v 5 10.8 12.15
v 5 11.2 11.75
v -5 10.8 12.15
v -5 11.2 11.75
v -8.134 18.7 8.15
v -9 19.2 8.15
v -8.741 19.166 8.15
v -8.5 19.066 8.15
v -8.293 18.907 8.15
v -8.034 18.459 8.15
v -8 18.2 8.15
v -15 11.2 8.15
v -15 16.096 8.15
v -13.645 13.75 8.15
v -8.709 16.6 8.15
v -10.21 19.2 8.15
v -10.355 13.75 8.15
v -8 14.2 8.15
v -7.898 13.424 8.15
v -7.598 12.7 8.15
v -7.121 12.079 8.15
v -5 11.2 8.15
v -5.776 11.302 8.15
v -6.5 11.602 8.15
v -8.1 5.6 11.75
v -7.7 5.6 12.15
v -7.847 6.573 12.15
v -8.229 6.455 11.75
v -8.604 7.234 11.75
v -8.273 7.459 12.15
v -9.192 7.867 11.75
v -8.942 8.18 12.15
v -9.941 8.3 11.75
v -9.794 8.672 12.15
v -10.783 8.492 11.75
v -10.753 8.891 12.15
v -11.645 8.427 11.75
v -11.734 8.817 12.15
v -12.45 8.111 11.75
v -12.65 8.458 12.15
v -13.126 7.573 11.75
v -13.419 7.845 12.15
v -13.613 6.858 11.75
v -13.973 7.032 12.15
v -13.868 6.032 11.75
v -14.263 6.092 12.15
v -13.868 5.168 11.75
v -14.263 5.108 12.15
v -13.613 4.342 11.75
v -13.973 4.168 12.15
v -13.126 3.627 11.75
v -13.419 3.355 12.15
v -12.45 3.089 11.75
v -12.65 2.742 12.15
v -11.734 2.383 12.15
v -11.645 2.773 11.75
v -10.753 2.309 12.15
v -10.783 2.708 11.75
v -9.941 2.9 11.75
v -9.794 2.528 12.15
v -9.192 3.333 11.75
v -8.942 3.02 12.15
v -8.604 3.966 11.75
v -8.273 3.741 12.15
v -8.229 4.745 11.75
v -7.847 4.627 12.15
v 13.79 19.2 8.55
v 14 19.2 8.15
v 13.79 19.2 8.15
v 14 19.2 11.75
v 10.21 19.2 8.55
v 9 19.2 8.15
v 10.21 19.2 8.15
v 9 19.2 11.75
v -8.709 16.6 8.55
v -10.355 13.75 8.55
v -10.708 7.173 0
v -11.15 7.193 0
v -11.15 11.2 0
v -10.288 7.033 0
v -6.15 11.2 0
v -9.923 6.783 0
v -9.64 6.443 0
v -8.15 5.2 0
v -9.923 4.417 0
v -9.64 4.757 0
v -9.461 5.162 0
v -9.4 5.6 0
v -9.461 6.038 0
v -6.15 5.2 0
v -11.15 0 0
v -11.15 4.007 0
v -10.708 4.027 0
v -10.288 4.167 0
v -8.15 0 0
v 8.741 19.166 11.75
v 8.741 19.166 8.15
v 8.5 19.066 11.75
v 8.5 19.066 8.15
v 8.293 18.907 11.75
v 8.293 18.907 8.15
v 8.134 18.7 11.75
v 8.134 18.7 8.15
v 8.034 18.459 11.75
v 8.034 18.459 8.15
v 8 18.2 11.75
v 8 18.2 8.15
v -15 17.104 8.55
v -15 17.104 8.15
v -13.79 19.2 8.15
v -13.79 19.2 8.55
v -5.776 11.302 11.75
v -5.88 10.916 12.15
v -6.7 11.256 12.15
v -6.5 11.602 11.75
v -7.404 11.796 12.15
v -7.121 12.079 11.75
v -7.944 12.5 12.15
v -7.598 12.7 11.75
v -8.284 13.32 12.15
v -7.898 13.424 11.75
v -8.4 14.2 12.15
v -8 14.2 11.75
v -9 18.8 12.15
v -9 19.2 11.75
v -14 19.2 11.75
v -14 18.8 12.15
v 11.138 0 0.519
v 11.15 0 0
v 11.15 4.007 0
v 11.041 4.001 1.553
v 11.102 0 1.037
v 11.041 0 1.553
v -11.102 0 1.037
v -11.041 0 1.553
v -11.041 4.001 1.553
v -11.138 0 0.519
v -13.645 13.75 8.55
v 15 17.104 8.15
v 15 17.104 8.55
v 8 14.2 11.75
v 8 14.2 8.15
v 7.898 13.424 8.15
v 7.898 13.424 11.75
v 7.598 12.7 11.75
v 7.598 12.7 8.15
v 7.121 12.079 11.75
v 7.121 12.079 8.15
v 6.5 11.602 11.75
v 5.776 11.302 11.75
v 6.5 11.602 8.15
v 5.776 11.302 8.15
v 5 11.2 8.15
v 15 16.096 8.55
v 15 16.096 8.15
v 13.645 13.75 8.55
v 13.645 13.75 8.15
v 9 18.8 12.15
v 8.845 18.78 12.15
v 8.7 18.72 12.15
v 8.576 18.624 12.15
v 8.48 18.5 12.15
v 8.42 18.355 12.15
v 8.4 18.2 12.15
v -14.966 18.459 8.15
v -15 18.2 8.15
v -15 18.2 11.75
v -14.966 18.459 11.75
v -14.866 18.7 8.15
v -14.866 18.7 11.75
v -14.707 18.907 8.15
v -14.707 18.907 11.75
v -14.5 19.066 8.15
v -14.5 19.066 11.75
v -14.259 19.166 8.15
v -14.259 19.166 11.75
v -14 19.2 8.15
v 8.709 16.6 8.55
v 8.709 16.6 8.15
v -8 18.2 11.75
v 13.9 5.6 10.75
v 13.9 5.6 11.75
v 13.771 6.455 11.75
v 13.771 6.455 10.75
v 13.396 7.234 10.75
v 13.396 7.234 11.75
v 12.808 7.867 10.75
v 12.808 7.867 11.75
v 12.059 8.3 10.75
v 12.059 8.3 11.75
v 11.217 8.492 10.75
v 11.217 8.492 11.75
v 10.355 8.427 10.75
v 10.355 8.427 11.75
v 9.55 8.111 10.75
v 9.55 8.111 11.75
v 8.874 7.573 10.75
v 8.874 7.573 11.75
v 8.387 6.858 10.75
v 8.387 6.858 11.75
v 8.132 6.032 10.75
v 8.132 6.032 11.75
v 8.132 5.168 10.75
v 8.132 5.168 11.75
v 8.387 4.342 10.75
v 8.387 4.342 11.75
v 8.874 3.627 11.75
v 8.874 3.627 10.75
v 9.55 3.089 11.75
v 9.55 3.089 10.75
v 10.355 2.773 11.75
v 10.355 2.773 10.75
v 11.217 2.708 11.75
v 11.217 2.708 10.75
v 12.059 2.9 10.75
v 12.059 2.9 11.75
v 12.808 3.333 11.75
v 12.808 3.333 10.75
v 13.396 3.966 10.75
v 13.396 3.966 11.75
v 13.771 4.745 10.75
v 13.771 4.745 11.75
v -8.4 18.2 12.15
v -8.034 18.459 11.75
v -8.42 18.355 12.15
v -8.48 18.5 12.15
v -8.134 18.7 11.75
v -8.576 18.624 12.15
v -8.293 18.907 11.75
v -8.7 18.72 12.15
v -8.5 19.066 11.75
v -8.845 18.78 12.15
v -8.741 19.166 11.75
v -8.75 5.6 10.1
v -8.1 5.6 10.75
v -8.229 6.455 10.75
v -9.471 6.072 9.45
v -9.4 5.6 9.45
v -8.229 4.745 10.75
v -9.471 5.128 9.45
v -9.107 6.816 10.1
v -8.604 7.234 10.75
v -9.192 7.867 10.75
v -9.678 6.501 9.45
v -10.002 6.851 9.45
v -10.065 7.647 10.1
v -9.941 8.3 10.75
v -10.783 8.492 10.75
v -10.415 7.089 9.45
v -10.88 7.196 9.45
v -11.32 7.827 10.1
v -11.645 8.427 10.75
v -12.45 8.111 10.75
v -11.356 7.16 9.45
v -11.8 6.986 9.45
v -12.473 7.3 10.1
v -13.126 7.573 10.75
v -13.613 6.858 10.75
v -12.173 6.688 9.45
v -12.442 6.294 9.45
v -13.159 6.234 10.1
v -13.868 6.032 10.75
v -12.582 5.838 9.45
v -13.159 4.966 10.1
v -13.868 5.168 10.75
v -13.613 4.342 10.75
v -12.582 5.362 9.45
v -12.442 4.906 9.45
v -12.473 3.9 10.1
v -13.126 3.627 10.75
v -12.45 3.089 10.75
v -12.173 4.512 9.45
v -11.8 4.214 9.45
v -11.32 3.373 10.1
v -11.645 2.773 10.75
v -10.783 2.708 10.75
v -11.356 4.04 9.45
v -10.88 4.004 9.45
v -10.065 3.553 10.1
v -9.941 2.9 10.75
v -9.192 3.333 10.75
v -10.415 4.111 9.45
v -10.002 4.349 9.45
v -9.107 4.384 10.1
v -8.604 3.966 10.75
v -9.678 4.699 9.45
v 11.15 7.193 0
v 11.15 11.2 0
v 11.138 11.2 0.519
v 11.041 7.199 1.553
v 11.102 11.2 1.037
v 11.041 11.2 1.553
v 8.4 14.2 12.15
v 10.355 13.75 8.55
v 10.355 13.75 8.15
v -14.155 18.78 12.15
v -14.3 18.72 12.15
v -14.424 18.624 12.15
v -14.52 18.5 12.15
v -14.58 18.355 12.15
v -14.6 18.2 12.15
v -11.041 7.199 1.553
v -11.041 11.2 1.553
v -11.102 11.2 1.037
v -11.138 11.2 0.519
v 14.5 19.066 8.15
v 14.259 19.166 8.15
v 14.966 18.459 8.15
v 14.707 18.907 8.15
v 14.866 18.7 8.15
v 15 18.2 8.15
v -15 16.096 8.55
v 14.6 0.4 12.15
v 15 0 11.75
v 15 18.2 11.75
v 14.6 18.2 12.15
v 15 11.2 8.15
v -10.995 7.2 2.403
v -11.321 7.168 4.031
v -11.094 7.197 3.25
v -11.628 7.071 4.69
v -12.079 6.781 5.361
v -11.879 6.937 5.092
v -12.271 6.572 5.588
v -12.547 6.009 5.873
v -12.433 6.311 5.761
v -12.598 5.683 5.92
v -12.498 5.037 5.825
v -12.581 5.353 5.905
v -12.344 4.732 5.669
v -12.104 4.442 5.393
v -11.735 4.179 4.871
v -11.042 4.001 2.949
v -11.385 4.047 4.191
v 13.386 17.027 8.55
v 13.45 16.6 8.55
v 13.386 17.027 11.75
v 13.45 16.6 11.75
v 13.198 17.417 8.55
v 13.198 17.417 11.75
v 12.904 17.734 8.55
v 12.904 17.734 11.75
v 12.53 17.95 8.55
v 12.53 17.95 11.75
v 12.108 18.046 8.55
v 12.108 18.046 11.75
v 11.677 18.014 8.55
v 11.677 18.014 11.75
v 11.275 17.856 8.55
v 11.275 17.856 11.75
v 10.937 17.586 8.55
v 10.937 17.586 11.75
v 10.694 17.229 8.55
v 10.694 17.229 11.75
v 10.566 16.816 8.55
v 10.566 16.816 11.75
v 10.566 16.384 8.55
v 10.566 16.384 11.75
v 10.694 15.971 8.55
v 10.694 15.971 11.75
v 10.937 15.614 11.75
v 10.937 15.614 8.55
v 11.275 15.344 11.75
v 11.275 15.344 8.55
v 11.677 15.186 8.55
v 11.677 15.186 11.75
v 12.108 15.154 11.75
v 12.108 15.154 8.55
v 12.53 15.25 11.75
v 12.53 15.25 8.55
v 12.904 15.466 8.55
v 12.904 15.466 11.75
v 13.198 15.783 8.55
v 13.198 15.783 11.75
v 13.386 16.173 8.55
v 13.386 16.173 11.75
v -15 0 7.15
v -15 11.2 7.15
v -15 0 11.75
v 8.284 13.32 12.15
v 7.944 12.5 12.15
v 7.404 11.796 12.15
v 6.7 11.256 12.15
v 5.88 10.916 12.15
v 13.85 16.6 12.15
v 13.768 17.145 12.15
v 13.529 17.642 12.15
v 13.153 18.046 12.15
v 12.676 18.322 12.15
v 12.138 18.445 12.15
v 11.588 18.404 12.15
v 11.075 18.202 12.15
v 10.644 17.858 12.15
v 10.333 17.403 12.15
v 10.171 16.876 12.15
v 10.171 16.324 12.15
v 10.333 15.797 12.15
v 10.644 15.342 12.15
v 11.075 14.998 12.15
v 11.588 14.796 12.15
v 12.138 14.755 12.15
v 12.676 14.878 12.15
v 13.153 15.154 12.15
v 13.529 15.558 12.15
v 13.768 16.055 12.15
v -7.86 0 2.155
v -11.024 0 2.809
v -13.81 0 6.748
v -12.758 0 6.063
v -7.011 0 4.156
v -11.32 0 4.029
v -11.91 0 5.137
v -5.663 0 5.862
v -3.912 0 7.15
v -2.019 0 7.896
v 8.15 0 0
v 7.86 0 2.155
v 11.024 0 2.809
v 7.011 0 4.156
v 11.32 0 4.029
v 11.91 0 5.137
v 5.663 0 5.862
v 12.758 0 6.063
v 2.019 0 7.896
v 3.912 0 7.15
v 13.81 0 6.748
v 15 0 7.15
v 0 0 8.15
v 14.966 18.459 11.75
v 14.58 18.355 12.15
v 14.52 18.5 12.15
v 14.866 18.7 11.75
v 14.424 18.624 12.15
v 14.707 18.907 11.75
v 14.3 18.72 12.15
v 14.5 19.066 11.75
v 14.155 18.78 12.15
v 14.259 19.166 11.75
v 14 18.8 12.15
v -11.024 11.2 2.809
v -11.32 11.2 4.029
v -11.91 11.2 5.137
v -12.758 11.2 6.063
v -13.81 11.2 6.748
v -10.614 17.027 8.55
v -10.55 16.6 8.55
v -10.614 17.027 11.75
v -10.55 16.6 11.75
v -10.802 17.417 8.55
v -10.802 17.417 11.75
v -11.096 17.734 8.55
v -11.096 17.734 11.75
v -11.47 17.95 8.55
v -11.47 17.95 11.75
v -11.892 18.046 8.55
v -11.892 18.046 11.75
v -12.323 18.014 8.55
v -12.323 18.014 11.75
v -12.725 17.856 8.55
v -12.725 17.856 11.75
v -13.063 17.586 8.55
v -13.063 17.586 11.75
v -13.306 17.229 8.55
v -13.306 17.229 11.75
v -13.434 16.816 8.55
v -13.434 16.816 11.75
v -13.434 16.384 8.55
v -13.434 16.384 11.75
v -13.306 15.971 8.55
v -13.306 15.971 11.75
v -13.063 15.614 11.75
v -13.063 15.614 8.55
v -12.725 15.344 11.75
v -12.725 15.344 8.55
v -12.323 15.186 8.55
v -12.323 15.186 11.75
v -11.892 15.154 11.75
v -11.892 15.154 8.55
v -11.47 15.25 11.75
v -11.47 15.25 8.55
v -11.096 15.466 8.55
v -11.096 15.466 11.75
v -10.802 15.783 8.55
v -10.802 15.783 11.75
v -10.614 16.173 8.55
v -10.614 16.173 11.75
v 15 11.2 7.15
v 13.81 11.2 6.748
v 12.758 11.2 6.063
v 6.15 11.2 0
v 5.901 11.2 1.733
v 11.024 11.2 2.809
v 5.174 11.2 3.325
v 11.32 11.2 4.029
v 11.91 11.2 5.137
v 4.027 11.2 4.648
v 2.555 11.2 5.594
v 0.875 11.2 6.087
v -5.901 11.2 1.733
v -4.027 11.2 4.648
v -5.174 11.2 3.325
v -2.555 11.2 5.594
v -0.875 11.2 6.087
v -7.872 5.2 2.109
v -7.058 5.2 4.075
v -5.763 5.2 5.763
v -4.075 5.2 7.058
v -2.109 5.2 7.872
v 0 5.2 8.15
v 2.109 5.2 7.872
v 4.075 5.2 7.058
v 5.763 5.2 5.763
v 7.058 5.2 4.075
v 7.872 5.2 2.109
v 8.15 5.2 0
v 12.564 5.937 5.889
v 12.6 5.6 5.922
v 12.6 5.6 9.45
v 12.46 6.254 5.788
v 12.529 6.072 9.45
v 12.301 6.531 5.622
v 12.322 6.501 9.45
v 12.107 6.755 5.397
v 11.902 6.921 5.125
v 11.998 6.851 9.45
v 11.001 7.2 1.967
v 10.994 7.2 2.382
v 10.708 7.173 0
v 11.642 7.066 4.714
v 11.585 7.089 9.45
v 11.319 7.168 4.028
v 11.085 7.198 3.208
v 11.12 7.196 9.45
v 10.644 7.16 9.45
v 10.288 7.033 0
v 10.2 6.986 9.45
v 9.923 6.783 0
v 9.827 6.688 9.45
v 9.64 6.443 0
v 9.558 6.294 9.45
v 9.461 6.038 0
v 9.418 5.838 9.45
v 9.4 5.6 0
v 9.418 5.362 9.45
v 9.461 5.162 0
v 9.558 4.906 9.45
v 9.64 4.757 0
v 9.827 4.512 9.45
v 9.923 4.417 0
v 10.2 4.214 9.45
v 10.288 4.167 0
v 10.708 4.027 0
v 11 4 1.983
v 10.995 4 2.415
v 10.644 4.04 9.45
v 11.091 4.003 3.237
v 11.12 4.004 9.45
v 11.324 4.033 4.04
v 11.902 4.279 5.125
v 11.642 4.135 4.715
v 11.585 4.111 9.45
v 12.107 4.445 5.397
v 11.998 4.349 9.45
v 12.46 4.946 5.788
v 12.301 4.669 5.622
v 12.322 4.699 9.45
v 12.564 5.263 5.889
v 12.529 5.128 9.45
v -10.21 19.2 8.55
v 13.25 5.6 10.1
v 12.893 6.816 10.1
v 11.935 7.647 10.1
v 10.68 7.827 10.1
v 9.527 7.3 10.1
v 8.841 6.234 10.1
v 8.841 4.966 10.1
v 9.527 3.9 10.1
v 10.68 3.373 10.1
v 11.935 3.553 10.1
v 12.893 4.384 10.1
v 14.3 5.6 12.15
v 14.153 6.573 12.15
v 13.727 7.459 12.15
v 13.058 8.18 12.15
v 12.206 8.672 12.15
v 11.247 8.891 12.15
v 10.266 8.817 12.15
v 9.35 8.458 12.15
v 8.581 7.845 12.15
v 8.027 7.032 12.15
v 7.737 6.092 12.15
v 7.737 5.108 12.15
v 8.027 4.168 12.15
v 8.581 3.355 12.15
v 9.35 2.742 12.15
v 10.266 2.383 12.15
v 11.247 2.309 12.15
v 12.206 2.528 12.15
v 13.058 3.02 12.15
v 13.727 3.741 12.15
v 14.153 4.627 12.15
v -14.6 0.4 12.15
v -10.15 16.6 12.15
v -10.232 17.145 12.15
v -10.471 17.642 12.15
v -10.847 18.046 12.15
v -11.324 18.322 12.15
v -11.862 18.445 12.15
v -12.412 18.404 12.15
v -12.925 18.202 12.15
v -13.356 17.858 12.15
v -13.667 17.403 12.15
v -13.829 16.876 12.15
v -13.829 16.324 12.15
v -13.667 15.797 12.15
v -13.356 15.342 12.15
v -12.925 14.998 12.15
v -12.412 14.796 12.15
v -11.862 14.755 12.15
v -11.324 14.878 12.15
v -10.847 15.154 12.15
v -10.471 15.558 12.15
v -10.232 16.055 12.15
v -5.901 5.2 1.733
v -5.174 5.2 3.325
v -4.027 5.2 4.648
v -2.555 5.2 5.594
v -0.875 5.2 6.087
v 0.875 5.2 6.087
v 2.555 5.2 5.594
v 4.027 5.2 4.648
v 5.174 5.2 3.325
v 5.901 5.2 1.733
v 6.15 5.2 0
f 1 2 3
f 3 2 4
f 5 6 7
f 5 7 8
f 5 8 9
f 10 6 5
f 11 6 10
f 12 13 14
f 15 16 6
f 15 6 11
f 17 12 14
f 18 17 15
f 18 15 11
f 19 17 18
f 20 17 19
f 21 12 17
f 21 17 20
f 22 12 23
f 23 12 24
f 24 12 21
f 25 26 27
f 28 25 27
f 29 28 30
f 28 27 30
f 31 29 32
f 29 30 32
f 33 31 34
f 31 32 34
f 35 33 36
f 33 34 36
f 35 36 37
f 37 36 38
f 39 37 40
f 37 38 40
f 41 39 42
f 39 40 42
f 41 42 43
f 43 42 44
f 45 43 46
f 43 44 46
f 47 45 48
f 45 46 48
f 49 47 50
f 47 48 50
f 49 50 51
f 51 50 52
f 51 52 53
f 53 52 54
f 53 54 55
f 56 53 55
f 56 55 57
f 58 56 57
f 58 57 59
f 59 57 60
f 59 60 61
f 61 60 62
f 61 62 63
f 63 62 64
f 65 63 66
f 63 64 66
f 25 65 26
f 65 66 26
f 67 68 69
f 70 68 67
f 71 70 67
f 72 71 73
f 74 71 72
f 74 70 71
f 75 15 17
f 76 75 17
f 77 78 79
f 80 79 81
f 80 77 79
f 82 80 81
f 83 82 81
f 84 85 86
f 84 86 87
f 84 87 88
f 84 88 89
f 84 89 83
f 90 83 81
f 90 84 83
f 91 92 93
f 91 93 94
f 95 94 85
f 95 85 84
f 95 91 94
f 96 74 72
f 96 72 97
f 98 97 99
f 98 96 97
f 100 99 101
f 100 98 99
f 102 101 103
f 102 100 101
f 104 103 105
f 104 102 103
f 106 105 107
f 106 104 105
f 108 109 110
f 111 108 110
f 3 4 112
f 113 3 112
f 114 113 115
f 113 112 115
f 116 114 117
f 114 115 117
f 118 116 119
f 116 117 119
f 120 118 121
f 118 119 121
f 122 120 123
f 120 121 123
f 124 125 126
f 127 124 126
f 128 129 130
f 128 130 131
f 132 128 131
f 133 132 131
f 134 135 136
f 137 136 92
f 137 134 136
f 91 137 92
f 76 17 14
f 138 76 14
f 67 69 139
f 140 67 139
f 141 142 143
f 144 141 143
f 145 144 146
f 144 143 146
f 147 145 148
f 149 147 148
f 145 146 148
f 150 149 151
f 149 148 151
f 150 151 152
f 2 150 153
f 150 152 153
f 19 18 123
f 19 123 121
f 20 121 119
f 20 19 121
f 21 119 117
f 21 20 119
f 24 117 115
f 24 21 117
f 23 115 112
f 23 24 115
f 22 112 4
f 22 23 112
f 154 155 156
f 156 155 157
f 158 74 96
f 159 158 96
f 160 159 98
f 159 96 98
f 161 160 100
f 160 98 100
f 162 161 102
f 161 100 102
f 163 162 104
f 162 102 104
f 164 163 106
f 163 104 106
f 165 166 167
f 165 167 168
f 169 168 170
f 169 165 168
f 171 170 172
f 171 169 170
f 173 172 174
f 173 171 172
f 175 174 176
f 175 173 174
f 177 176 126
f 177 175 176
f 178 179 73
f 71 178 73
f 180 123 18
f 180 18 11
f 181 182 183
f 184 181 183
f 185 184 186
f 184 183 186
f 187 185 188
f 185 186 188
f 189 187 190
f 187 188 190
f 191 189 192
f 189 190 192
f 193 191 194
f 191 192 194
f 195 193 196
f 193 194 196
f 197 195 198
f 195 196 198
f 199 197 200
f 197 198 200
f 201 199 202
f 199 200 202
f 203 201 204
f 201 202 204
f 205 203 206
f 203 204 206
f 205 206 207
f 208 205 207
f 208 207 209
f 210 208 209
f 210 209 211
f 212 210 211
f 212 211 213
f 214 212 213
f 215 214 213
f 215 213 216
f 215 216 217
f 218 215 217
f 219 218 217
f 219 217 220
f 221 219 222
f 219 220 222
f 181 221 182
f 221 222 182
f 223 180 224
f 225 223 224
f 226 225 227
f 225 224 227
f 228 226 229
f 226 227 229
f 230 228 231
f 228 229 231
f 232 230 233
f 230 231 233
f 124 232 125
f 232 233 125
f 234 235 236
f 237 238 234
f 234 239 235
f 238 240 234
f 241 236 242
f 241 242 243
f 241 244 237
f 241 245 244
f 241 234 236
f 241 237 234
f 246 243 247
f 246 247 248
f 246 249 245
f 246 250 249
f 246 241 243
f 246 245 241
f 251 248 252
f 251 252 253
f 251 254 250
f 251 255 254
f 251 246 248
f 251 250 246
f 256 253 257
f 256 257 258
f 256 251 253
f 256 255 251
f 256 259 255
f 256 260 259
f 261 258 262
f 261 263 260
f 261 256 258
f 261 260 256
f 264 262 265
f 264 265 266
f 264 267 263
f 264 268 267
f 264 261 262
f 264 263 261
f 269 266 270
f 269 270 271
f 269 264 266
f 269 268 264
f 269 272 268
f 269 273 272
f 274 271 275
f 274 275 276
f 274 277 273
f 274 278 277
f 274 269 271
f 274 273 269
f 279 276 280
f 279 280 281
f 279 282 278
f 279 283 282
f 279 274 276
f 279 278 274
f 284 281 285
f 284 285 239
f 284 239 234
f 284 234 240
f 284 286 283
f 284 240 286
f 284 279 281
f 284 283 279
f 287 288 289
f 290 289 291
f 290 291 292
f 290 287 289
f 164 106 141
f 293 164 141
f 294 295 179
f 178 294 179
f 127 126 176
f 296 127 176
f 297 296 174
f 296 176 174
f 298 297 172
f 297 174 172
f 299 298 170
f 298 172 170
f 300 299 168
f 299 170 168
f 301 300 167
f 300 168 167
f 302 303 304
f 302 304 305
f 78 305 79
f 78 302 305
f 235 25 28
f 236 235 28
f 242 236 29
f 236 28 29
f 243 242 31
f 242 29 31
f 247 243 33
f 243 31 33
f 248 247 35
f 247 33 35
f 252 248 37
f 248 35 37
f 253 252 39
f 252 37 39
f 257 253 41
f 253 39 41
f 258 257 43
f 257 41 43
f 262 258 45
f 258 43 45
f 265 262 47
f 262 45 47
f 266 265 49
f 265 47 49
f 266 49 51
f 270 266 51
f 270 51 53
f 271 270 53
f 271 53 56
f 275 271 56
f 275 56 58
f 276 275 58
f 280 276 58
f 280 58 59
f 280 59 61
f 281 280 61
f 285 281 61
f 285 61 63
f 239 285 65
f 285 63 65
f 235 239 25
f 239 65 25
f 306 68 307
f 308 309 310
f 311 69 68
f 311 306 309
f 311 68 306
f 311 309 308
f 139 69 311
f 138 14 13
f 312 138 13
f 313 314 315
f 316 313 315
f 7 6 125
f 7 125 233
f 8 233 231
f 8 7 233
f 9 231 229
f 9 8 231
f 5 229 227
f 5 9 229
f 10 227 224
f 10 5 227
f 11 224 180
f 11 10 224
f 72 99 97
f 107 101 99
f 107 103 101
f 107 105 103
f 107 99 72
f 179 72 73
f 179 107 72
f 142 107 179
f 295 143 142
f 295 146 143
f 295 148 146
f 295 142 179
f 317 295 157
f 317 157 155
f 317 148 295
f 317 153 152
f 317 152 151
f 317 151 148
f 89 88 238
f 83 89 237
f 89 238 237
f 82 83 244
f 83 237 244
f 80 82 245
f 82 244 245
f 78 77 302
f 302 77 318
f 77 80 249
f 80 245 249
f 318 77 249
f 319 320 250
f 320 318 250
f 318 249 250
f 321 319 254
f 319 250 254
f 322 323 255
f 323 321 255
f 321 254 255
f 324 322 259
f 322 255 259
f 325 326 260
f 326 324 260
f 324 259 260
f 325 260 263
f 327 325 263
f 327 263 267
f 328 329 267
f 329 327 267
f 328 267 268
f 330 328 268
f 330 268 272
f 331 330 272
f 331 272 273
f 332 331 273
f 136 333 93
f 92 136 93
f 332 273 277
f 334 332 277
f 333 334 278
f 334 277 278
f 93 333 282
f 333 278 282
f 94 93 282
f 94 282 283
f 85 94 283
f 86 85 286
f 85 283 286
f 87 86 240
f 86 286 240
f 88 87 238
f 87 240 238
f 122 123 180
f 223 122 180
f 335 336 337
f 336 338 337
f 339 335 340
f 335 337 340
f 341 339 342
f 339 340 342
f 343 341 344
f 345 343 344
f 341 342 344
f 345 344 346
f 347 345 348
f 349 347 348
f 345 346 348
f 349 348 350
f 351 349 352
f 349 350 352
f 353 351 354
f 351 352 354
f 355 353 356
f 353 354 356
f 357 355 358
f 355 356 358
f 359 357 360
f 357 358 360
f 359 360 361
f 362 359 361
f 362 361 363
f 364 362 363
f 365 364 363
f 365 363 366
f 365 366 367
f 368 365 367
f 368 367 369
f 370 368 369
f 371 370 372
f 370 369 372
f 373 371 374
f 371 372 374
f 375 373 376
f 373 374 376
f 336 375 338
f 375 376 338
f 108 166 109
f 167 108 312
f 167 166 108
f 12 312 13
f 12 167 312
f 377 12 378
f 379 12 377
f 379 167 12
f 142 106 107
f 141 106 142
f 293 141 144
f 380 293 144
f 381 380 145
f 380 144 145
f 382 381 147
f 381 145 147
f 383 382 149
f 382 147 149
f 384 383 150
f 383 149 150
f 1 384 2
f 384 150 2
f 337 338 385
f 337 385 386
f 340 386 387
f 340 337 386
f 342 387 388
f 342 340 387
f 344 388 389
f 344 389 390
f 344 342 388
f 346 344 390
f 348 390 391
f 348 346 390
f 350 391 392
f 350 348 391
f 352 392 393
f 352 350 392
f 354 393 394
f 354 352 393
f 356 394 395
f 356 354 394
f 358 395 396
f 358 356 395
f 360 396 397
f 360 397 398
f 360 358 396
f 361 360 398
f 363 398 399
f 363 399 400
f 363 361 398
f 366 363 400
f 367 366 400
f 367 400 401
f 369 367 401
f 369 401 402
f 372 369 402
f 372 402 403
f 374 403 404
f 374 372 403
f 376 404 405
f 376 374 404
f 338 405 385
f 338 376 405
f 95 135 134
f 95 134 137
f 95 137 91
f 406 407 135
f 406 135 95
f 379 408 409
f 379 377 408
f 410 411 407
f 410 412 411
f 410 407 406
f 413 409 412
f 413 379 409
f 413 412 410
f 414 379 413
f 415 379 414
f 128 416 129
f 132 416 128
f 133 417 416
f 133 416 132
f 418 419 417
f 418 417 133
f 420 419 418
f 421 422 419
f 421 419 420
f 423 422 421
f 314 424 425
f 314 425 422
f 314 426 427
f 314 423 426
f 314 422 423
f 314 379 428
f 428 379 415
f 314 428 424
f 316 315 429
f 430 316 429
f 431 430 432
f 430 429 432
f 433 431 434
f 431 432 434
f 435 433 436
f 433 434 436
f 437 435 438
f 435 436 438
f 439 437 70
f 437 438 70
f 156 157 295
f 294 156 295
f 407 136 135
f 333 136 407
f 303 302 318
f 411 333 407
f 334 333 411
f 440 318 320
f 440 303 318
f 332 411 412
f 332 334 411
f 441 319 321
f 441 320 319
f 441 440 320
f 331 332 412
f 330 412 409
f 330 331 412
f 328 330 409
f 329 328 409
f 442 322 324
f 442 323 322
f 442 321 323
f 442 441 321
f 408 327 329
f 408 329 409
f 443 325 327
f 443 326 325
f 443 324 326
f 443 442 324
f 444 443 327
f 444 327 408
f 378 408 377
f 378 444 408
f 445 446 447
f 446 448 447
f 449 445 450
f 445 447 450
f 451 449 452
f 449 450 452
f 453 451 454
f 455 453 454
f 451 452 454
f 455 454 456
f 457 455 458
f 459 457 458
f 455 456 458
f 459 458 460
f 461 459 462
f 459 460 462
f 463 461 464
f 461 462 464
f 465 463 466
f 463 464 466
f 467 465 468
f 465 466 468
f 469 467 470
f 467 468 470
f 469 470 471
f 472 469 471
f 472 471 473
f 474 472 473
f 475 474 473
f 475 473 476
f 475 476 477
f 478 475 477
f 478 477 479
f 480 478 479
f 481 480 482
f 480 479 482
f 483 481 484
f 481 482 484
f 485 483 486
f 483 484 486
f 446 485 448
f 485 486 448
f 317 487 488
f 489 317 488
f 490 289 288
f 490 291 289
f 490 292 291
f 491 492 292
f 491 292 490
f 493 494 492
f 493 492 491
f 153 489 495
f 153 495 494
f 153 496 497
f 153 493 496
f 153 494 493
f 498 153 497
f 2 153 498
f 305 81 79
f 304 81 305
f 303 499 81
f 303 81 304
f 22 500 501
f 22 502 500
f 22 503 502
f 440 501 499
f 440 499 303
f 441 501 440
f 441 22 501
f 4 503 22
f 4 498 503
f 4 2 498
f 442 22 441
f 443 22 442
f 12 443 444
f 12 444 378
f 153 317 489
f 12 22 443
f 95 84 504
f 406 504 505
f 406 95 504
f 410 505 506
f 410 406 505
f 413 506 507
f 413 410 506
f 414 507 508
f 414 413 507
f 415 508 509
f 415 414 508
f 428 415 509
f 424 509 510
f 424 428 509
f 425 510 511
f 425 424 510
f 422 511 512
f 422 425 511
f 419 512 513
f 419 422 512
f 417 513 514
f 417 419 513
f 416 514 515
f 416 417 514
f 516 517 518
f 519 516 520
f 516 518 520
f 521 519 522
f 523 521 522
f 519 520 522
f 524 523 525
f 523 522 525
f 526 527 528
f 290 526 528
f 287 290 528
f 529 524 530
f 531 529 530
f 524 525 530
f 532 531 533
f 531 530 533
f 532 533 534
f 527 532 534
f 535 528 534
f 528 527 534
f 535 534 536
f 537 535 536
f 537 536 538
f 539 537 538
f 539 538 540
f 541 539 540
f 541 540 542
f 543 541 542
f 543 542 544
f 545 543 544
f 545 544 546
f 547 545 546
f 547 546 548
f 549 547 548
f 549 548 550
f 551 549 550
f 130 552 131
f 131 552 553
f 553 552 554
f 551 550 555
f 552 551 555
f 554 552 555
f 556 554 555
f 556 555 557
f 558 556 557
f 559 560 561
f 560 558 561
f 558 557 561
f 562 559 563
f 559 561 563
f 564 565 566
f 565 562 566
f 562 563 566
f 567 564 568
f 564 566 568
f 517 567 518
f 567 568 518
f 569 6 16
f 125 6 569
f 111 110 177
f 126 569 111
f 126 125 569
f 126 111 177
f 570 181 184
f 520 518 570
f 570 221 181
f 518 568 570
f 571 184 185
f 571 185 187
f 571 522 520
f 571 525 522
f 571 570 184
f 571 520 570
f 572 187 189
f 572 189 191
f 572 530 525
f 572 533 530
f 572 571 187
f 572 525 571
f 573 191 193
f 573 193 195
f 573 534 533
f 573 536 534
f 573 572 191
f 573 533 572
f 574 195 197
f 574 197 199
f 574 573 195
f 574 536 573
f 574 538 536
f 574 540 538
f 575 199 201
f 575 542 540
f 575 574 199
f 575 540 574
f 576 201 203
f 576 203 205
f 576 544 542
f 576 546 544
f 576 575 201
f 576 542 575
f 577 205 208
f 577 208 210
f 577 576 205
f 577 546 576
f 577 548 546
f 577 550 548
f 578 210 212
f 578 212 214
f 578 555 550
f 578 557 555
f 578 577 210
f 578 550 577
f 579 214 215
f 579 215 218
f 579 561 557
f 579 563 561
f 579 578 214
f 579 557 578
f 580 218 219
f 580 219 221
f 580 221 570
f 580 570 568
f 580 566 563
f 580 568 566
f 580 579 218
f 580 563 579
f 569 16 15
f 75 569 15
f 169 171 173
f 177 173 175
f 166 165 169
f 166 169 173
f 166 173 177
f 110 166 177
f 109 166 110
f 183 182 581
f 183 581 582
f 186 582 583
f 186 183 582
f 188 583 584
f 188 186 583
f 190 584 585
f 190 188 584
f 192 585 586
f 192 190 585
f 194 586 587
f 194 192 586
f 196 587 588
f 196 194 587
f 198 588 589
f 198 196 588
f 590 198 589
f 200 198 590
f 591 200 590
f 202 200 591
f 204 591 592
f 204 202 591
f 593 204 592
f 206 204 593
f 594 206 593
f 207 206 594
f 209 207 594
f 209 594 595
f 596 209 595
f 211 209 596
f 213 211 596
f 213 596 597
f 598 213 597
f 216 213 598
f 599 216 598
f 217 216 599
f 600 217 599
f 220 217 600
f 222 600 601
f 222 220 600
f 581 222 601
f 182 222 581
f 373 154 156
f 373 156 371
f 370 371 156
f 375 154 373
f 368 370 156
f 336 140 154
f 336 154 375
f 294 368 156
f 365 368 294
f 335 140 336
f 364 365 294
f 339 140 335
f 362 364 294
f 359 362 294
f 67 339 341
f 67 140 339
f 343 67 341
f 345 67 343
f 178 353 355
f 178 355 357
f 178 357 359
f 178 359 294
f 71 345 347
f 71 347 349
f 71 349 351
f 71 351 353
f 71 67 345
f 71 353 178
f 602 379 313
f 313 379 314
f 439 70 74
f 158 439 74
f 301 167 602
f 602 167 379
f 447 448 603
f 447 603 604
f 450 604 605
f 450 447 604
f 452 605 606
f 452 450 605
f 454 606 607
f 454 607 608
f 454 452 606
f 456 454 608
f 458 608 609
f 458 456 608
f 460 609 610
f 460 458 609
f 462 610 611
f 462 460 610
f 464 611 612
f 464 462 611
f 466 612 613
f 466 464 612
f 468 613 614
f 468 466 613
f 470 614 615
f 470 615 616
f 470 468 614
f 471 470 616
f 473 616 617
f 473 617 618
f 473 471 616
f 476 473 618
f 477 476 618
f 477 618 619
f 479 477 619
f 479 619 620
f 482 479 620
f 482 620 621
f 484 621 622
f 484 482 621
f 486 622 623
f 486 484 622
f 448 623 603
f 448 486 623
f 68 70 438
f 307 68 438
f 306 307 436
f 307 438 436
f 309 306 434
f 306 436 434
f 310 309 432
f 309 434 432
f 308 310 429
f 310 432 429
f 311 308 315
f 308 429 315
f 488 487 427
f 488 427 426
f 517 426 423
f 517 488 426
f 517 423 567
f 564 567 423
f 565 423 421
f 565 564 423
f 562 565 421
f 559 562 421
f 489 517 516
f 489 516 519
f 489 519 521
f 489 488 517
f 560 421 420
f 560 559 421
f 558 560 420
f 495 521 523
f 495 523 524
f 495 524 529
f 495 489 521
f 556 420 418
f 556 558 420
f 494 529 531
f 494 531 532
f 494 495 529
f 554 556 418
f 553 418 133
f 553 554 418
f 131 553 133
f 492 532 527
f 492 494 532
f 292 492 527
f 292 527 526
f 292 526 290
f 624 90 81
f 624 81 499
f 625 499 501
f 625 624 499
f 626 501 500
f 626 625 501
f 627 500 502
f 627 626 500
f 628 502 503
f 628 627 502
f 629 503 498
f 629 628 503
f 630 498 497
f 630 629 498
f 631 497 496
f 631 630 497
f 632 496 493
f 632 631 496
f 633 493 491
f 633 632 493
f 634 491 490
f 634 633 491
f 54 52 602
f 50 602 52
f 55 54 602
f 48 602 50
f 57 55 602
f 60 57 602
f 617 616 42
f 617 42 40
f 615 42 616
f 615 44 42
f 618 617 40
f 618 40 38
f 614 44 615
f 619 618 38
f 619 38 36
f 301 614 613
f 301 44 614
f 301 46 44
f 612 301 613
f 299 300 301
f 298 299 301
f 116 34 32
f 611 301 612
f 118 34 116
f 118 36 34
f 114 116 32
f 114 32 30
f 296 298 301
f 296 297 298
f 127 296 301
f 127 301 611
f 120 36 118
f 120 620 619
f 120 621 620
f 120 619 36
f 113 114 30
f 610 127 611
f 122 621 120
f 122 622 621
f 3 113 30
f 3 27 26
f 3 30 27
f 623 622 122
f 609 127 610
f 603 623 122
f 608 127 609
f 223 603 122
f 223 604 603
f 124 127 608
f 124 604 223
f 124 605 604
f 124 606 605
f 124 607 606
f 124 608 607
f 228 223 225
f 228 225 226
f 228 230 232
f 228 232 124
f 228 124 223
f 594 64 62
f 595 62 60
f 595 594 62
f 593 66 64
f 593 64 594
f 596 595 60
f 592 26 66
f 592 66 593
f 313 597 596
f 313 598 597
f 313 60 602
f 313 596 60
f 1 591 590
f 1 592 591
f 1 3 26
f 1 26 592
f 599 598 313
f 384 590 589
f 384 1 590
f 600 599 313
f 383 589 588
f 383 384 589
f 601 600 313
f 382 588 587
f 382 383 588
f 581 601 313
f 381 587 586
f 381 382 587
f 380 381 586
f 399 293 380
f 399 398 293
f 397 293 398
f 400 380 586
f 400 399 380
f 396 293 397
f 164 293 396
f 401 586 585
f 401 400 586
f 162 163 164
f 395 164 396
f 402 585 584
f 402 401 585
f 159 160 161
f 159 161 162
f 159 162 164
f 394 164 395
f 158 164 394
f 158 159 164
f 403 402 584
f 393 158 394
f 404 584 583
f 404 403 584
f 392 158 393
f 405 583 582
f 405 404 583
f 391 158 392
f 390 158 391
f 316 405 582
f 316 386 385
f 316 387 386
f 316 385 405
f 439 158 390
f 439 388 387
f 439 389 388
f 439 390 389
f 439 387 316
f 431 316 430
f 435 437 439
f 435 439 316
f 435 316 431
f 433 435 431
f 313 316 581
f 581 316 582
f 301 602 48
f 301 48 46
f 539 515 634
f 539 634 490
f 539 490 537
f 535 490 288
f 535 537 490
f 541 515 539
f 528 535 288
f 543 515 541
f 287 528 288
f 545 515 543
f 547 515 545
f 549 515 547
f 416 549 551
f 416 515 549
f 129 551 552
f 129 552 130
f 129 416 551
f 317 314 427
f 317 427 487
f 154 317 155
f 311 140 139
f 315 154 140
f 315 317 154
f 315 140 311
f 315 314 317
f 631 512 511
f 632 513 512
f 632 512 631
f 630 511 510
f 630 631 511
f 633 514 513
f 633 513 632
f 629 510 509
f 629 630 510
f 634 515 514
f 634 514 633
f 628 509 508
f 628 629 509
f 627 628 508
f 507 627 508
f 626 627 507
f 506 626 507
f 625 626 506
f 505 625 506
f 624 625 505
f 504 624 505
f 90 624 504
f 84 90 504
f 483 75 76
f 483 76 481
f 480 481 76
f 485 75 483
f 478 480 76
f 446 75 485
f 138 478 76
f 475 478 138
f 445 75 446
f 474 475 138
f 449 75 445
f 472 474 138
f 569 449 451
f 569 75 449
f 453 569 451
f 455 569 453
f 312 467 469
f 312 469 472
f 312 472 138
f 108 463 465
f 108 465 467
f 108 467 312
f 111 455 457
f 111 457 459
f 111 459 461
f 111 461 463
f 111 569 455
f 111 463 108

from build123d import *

# Parameters (mm, degrees)
EXTRUDE_1_DEPTH     = 5.2
EXTRUDE_2_DEPTH     = 6
EXTRUDE_START       = -11.2
EXTRUDE_3_DEPTH     = 11.2
FILLET_1_R          = 5
SKETCH_4_R          = 1.6
CUT_EXTRUDE_1_DEPTH = 22.789045413
SKETCH_7_W          = 7
SKETCH_7_H          = 3
EXTRUDE_5_DEPTH     = 8
SKETCH_8_R          = 1.45
CUT_EXTRUDE_3_DEPTH = 8
EXTRUDE_START_2     = 1
SKETCH_9_R          = 1.45
SKETCH_9_R_2        = 1.6
EXTRUDE_6_DEPTH     = 1
FILLET_2_R          = 3
FILLET_3_R          = 1
SKETCH_10_R         = 2.9
CUT_EXTRUDE_4_DEPTH = 2.7
CHAMFER_2_SIZE      = 1.3
CHAMFER_1_SIZE      = 0.4
CUT_EXTRUDE_5_DEPTH = 0.4


# Some blends are built 0.0001 mm under size
with BuildPart() as part:
    # 草图1 → 凸台-拉伸1 (new body)
    with BuildSketch(Plane(origin=(0, 0, 0), x_dir=(1, 0, 0), z_dir=(0, 1, 0))):
        with BuildLine():
            Line((-11.15, 0), (-8.15, 0))
            ThreePointArc((-8.15, 0), (0, -8.15), (8.15, 0))
            Line((8.15, 0), (11.15, 0))
            ThreePointArc((11.15, 0), (0, -11.15), (-11.15, 0))
        make_face()
    extrude(amount=EXTRUDE_1_DEPTH)

    # 草图2 → 凸台-拉伸2 (add)
    with BuildSketch(Plane(origin=(0, 5.2, 0), x_dir=(1, 0, 0), z_dir=(0, 1, 0))):
        with BuildLine():
            Line((-11.15, 0), (-6.15, 0))
            ThreePointArc((-6.15, 0), (0, -6.15), (6.15, 0))
            Line((6.15, 0), (11.15, 0))
            ThreePointArc((11.15, 0), (0, -11.15), (-11.15, 0))
        make_face()
    extrude(amount=EXTRUDE_2_DEPTH)

    # 草图3 → 凸台-拉伸3 (add)
    with BuildSketch(Plane(origin=(0, 11.2, 0), x_dir=(1, 0, 0), z_dir=(0, 1, 0)).offset(EXTRUDE_START)):
        with BuildLine():
            Line((3.911521443, -7.15), (15, -7.15))
            Line((15, -7.15), (15, -11.15))
            Line((15, -11.15), (-15, -11.15))
            Line((-15, -11.15), (-15, -7.15))
            Line((-15, -7.15), (-3.911521443, -7.15))
            ThreePointArc((-3.911521443, -7.15), (0, -8.15), (3.911521443, -7.15))
        make_face()
    extrude(amount=EXTRUDE_3_DEPTH)

    # 圆角1
    # the kernel refuses this fillet: 5 mm, written as the material it adds along each edge
    with BuildSketch(Plane(origin=(-8.555699854, 11.2, 7.15), x_dir=(-0.4058769598957605, 0, -0.9139277287760642), z_dir=(0, -1, 0))) as fillet_1_piece_1:
        with BuildLine():
            CenterArc((7.497147581, -4.807763049), FILLET_1_R, 105.939417034, 86.556633096)
            Line((2.615592952, -5.889624596), (2.517961859, -5.911261826))
            ThreePointArc((2.517961859, -5.911261826), (1.216403703, -2.985399994), (-0.091392773, -0.040587696))
            Line((-0.091392773, -0.040587696), (0.027462079, 0.096155261))
            ThreePointArc((0.027462079, 0.096155261), (3.062021814, -0.328688401), (6.096581549, 0.096155261))
            Line((6.096581549, 0.096155261), (6.124043628, 0))
        make_face()
    extrude(amount=11.2)
    with BuildSketch(Plane(origin=(8.555699854, 11.2, 7.15), x_dir=(1, 0, 0), z_dir=(0, -1, 0))) as fillet_1_piece_2:
        with BuildLine():
            CenterArc((7.436867432, -4.90049081), FILLET_1_R, 101.450043509, 86.556633096)
            Line((2.48560821, -5.596933284), (2.386583026, -5.610862133))
            ThreePointArc((2.386583026, -5.610862133), (1.543201548, -2.665059593), (-0.076732734, -0.064125561))
            Line((-0.076732734, -0.064125561), (0, 0.1))
            ThreePointArc((0, 0.1), (3.222150073, 0.1), (6.4244488, 0.098009816))
            Line((6.4244488, 0.098009816), (6.444300146, 0))
        make_face()
    extrude(amount=11.2)

    # 草图4 → 切除-拉伸1 (cut, through all)
    with BuildSketch(Plane.XY.offset(11.15)):
        with Locations((-11, 5.6)):
            Circle(SKETCH_4_R)
        with Locations((11, 5.6)):
            Circle(SKETCH_4_R)
    extrude(amount=-CUT_EXTRUDE_1_DEPTH, mode=Mode.SUBTRACT)

    # 草图7 → 凸台-拉伸5 (add)
    with BuildSketch(Plane(origin=(0, 11.2, 0), x_dir=(1, 0, 0), z_dir=(0, 1, 0))):
        with Locations((-11.5, -9.65)):
            Rectangle(SKETCH_7_W, SKETCH_7_H)
        with Locations((11.5, -9.65)):
            Rectangle(SKETCH_7_W, SKETCH_7_H)
    extrude(amount=EXTRUDE_5_DEPTH)

    # 草图8 → 切除-拉伸3 (cut)
    with BuildSketch(Plane.XY.offset(11.15)):
        with Locations((-12, 16.6)):
            Circle(SKETCH_8_R)
        with Locations((12, 16.6)):
            Circle(SKETCH_8_R)
    extrude(amount=-CUT_EXTRUDE_3_DEPTH, mode=Mode.SUBTRACT)

    # 草图9 → 凸台-拉伸6 (add)
    with BuildSketch(Plane.XY.offset(11.15).offset(EXTRUDE_START_2)):
        Polygon((-15, 19.2), (-15, 0), (15, 0), (15, 19.2), (8, 19.2), (8, 11.2), (-8, 11.2), (-8, 19.2), align=None)
        with Locations((-12, 16.6)):
            Circle(SKETCH_9_R, mode=Mode.SUBTRACT)
        with Locations((-11, 5.6)):
            Circle(SKETCH_9_R_2, mode=Mode.SUBTRACT)
        with Locations((11, 5.6)):
            Circle(SKETCH_9_R_2, mode=Mode.SUBTRACT)
        with Locations((12, 16.6)):
            Circle(SKETCH_9_R, mode=Mode.SUBTRACT)
    extrude(amount=-EXTRUDE_6_DEPTH)

    # 圆角2
    fillet_2_edges = [part.edges().sort_by_distance(p)[0] for p in [
        (8, 11.2, 10.15),
        (-8, 11.2, 10.15),
    ]]
    fillet(fillet_2_edges, radius=FILLET_2_R)

    # 圆角3
    fillet_3_edges = [part.edges().sort_by_distance(p)[0] for p in [
        (15, 19.2, 10.15),
        (8, 19.2, 10.15),
        (-15, 19.2, 10.15),
        (-8, 19.2, 10.15),
    ]]
    fillet(fillet_3_edges, radius=FILLET_3_R)

    # 草图10 → 切除-拉伸4 (cut)
    with BuildSketch(Plane.XY.offset(12.15)):
        with Locations((-11, 5.6)):
            Circle(SKETCH_10_R)
        with Locations((11, 5.6)):
            Circle(SKETCH_10_R)
    extrude(amount=-CUT_EXTRUDE_4_DEPTH, mode=Mode.SUBTRACT)

    # 倒角2
    chamfer_2_edges = [part.edges().sort_by_distance(p)[0] for p in [
        (-13.9, 5.6, 9.45),
        (8.1, 5.6, 9.45),
    ]]
    chamfer(chamfer_2_edges, length=CHAMFER_2_SIZE - 0.0001)  # a hair under: the kernel refuses the full size

    # 倒角1
    chamfer_1_edges = [part.edges().sort_by_distance(p)[0] for p in [
        (0, 0, 12.15),
        (15, 9.1, 12.15),
        (-13.45, 16.6, 12.15),
        (10.55, 16.6, 12.15),
        (0, 11.2, 12.15),
        (-8, 16.2, 12.15),
        (7.121320344, 12.078679656, 12.15),
        (-7.121320344, 12.078679656, 12.15),
        (11.5, 19.2, 12.15),
        (-11.5, 19.2, 12.15),
        (-15, 9.1, 12.15),
        (8, 16.2, 12.15),
        (-14.707106781, 18.907106781, 12.15),
        (-8.292893219, 18.907106781, 12.15),
        (8.292893219, 18.907106781, 12.15),
        (14.707106781, 18.907106781, 12.15),
        (-13.9, 5.6, 12.15),
        (8.1, 5.6, 12.15),
    ]]
    chamfer(chamfer_1_edges, length=CHAMFER_1_SIZE)

    # 草图11 → 切除-拉伸5 (cut)
    with BuildSketch(Plane(origin=(0, 0, 8.15), x_dir=(-1, 0, 0), z_dir=(0, 0, -1))):
        Polygon((-8.709103466, 16.6), (-10.354551733, 19.45), (-13.645448267, 19.45), (-15.290896534, 16.6), (-13.645448267, 13.75), (-10.354551733, 13.75), align=None)
        Polygon((15.290896534, 16.6), (13.645448267, 19.45), (10.354551733, 19.45), (8.709103466, 16.6), (10.354551733, 13.75), (13.645448267, 13.75), align=None)
    extrude(amount=-CUT_EXTRUDE_5_DEPTH, mode=Mode.SUBTRACT)


solid = part.part
